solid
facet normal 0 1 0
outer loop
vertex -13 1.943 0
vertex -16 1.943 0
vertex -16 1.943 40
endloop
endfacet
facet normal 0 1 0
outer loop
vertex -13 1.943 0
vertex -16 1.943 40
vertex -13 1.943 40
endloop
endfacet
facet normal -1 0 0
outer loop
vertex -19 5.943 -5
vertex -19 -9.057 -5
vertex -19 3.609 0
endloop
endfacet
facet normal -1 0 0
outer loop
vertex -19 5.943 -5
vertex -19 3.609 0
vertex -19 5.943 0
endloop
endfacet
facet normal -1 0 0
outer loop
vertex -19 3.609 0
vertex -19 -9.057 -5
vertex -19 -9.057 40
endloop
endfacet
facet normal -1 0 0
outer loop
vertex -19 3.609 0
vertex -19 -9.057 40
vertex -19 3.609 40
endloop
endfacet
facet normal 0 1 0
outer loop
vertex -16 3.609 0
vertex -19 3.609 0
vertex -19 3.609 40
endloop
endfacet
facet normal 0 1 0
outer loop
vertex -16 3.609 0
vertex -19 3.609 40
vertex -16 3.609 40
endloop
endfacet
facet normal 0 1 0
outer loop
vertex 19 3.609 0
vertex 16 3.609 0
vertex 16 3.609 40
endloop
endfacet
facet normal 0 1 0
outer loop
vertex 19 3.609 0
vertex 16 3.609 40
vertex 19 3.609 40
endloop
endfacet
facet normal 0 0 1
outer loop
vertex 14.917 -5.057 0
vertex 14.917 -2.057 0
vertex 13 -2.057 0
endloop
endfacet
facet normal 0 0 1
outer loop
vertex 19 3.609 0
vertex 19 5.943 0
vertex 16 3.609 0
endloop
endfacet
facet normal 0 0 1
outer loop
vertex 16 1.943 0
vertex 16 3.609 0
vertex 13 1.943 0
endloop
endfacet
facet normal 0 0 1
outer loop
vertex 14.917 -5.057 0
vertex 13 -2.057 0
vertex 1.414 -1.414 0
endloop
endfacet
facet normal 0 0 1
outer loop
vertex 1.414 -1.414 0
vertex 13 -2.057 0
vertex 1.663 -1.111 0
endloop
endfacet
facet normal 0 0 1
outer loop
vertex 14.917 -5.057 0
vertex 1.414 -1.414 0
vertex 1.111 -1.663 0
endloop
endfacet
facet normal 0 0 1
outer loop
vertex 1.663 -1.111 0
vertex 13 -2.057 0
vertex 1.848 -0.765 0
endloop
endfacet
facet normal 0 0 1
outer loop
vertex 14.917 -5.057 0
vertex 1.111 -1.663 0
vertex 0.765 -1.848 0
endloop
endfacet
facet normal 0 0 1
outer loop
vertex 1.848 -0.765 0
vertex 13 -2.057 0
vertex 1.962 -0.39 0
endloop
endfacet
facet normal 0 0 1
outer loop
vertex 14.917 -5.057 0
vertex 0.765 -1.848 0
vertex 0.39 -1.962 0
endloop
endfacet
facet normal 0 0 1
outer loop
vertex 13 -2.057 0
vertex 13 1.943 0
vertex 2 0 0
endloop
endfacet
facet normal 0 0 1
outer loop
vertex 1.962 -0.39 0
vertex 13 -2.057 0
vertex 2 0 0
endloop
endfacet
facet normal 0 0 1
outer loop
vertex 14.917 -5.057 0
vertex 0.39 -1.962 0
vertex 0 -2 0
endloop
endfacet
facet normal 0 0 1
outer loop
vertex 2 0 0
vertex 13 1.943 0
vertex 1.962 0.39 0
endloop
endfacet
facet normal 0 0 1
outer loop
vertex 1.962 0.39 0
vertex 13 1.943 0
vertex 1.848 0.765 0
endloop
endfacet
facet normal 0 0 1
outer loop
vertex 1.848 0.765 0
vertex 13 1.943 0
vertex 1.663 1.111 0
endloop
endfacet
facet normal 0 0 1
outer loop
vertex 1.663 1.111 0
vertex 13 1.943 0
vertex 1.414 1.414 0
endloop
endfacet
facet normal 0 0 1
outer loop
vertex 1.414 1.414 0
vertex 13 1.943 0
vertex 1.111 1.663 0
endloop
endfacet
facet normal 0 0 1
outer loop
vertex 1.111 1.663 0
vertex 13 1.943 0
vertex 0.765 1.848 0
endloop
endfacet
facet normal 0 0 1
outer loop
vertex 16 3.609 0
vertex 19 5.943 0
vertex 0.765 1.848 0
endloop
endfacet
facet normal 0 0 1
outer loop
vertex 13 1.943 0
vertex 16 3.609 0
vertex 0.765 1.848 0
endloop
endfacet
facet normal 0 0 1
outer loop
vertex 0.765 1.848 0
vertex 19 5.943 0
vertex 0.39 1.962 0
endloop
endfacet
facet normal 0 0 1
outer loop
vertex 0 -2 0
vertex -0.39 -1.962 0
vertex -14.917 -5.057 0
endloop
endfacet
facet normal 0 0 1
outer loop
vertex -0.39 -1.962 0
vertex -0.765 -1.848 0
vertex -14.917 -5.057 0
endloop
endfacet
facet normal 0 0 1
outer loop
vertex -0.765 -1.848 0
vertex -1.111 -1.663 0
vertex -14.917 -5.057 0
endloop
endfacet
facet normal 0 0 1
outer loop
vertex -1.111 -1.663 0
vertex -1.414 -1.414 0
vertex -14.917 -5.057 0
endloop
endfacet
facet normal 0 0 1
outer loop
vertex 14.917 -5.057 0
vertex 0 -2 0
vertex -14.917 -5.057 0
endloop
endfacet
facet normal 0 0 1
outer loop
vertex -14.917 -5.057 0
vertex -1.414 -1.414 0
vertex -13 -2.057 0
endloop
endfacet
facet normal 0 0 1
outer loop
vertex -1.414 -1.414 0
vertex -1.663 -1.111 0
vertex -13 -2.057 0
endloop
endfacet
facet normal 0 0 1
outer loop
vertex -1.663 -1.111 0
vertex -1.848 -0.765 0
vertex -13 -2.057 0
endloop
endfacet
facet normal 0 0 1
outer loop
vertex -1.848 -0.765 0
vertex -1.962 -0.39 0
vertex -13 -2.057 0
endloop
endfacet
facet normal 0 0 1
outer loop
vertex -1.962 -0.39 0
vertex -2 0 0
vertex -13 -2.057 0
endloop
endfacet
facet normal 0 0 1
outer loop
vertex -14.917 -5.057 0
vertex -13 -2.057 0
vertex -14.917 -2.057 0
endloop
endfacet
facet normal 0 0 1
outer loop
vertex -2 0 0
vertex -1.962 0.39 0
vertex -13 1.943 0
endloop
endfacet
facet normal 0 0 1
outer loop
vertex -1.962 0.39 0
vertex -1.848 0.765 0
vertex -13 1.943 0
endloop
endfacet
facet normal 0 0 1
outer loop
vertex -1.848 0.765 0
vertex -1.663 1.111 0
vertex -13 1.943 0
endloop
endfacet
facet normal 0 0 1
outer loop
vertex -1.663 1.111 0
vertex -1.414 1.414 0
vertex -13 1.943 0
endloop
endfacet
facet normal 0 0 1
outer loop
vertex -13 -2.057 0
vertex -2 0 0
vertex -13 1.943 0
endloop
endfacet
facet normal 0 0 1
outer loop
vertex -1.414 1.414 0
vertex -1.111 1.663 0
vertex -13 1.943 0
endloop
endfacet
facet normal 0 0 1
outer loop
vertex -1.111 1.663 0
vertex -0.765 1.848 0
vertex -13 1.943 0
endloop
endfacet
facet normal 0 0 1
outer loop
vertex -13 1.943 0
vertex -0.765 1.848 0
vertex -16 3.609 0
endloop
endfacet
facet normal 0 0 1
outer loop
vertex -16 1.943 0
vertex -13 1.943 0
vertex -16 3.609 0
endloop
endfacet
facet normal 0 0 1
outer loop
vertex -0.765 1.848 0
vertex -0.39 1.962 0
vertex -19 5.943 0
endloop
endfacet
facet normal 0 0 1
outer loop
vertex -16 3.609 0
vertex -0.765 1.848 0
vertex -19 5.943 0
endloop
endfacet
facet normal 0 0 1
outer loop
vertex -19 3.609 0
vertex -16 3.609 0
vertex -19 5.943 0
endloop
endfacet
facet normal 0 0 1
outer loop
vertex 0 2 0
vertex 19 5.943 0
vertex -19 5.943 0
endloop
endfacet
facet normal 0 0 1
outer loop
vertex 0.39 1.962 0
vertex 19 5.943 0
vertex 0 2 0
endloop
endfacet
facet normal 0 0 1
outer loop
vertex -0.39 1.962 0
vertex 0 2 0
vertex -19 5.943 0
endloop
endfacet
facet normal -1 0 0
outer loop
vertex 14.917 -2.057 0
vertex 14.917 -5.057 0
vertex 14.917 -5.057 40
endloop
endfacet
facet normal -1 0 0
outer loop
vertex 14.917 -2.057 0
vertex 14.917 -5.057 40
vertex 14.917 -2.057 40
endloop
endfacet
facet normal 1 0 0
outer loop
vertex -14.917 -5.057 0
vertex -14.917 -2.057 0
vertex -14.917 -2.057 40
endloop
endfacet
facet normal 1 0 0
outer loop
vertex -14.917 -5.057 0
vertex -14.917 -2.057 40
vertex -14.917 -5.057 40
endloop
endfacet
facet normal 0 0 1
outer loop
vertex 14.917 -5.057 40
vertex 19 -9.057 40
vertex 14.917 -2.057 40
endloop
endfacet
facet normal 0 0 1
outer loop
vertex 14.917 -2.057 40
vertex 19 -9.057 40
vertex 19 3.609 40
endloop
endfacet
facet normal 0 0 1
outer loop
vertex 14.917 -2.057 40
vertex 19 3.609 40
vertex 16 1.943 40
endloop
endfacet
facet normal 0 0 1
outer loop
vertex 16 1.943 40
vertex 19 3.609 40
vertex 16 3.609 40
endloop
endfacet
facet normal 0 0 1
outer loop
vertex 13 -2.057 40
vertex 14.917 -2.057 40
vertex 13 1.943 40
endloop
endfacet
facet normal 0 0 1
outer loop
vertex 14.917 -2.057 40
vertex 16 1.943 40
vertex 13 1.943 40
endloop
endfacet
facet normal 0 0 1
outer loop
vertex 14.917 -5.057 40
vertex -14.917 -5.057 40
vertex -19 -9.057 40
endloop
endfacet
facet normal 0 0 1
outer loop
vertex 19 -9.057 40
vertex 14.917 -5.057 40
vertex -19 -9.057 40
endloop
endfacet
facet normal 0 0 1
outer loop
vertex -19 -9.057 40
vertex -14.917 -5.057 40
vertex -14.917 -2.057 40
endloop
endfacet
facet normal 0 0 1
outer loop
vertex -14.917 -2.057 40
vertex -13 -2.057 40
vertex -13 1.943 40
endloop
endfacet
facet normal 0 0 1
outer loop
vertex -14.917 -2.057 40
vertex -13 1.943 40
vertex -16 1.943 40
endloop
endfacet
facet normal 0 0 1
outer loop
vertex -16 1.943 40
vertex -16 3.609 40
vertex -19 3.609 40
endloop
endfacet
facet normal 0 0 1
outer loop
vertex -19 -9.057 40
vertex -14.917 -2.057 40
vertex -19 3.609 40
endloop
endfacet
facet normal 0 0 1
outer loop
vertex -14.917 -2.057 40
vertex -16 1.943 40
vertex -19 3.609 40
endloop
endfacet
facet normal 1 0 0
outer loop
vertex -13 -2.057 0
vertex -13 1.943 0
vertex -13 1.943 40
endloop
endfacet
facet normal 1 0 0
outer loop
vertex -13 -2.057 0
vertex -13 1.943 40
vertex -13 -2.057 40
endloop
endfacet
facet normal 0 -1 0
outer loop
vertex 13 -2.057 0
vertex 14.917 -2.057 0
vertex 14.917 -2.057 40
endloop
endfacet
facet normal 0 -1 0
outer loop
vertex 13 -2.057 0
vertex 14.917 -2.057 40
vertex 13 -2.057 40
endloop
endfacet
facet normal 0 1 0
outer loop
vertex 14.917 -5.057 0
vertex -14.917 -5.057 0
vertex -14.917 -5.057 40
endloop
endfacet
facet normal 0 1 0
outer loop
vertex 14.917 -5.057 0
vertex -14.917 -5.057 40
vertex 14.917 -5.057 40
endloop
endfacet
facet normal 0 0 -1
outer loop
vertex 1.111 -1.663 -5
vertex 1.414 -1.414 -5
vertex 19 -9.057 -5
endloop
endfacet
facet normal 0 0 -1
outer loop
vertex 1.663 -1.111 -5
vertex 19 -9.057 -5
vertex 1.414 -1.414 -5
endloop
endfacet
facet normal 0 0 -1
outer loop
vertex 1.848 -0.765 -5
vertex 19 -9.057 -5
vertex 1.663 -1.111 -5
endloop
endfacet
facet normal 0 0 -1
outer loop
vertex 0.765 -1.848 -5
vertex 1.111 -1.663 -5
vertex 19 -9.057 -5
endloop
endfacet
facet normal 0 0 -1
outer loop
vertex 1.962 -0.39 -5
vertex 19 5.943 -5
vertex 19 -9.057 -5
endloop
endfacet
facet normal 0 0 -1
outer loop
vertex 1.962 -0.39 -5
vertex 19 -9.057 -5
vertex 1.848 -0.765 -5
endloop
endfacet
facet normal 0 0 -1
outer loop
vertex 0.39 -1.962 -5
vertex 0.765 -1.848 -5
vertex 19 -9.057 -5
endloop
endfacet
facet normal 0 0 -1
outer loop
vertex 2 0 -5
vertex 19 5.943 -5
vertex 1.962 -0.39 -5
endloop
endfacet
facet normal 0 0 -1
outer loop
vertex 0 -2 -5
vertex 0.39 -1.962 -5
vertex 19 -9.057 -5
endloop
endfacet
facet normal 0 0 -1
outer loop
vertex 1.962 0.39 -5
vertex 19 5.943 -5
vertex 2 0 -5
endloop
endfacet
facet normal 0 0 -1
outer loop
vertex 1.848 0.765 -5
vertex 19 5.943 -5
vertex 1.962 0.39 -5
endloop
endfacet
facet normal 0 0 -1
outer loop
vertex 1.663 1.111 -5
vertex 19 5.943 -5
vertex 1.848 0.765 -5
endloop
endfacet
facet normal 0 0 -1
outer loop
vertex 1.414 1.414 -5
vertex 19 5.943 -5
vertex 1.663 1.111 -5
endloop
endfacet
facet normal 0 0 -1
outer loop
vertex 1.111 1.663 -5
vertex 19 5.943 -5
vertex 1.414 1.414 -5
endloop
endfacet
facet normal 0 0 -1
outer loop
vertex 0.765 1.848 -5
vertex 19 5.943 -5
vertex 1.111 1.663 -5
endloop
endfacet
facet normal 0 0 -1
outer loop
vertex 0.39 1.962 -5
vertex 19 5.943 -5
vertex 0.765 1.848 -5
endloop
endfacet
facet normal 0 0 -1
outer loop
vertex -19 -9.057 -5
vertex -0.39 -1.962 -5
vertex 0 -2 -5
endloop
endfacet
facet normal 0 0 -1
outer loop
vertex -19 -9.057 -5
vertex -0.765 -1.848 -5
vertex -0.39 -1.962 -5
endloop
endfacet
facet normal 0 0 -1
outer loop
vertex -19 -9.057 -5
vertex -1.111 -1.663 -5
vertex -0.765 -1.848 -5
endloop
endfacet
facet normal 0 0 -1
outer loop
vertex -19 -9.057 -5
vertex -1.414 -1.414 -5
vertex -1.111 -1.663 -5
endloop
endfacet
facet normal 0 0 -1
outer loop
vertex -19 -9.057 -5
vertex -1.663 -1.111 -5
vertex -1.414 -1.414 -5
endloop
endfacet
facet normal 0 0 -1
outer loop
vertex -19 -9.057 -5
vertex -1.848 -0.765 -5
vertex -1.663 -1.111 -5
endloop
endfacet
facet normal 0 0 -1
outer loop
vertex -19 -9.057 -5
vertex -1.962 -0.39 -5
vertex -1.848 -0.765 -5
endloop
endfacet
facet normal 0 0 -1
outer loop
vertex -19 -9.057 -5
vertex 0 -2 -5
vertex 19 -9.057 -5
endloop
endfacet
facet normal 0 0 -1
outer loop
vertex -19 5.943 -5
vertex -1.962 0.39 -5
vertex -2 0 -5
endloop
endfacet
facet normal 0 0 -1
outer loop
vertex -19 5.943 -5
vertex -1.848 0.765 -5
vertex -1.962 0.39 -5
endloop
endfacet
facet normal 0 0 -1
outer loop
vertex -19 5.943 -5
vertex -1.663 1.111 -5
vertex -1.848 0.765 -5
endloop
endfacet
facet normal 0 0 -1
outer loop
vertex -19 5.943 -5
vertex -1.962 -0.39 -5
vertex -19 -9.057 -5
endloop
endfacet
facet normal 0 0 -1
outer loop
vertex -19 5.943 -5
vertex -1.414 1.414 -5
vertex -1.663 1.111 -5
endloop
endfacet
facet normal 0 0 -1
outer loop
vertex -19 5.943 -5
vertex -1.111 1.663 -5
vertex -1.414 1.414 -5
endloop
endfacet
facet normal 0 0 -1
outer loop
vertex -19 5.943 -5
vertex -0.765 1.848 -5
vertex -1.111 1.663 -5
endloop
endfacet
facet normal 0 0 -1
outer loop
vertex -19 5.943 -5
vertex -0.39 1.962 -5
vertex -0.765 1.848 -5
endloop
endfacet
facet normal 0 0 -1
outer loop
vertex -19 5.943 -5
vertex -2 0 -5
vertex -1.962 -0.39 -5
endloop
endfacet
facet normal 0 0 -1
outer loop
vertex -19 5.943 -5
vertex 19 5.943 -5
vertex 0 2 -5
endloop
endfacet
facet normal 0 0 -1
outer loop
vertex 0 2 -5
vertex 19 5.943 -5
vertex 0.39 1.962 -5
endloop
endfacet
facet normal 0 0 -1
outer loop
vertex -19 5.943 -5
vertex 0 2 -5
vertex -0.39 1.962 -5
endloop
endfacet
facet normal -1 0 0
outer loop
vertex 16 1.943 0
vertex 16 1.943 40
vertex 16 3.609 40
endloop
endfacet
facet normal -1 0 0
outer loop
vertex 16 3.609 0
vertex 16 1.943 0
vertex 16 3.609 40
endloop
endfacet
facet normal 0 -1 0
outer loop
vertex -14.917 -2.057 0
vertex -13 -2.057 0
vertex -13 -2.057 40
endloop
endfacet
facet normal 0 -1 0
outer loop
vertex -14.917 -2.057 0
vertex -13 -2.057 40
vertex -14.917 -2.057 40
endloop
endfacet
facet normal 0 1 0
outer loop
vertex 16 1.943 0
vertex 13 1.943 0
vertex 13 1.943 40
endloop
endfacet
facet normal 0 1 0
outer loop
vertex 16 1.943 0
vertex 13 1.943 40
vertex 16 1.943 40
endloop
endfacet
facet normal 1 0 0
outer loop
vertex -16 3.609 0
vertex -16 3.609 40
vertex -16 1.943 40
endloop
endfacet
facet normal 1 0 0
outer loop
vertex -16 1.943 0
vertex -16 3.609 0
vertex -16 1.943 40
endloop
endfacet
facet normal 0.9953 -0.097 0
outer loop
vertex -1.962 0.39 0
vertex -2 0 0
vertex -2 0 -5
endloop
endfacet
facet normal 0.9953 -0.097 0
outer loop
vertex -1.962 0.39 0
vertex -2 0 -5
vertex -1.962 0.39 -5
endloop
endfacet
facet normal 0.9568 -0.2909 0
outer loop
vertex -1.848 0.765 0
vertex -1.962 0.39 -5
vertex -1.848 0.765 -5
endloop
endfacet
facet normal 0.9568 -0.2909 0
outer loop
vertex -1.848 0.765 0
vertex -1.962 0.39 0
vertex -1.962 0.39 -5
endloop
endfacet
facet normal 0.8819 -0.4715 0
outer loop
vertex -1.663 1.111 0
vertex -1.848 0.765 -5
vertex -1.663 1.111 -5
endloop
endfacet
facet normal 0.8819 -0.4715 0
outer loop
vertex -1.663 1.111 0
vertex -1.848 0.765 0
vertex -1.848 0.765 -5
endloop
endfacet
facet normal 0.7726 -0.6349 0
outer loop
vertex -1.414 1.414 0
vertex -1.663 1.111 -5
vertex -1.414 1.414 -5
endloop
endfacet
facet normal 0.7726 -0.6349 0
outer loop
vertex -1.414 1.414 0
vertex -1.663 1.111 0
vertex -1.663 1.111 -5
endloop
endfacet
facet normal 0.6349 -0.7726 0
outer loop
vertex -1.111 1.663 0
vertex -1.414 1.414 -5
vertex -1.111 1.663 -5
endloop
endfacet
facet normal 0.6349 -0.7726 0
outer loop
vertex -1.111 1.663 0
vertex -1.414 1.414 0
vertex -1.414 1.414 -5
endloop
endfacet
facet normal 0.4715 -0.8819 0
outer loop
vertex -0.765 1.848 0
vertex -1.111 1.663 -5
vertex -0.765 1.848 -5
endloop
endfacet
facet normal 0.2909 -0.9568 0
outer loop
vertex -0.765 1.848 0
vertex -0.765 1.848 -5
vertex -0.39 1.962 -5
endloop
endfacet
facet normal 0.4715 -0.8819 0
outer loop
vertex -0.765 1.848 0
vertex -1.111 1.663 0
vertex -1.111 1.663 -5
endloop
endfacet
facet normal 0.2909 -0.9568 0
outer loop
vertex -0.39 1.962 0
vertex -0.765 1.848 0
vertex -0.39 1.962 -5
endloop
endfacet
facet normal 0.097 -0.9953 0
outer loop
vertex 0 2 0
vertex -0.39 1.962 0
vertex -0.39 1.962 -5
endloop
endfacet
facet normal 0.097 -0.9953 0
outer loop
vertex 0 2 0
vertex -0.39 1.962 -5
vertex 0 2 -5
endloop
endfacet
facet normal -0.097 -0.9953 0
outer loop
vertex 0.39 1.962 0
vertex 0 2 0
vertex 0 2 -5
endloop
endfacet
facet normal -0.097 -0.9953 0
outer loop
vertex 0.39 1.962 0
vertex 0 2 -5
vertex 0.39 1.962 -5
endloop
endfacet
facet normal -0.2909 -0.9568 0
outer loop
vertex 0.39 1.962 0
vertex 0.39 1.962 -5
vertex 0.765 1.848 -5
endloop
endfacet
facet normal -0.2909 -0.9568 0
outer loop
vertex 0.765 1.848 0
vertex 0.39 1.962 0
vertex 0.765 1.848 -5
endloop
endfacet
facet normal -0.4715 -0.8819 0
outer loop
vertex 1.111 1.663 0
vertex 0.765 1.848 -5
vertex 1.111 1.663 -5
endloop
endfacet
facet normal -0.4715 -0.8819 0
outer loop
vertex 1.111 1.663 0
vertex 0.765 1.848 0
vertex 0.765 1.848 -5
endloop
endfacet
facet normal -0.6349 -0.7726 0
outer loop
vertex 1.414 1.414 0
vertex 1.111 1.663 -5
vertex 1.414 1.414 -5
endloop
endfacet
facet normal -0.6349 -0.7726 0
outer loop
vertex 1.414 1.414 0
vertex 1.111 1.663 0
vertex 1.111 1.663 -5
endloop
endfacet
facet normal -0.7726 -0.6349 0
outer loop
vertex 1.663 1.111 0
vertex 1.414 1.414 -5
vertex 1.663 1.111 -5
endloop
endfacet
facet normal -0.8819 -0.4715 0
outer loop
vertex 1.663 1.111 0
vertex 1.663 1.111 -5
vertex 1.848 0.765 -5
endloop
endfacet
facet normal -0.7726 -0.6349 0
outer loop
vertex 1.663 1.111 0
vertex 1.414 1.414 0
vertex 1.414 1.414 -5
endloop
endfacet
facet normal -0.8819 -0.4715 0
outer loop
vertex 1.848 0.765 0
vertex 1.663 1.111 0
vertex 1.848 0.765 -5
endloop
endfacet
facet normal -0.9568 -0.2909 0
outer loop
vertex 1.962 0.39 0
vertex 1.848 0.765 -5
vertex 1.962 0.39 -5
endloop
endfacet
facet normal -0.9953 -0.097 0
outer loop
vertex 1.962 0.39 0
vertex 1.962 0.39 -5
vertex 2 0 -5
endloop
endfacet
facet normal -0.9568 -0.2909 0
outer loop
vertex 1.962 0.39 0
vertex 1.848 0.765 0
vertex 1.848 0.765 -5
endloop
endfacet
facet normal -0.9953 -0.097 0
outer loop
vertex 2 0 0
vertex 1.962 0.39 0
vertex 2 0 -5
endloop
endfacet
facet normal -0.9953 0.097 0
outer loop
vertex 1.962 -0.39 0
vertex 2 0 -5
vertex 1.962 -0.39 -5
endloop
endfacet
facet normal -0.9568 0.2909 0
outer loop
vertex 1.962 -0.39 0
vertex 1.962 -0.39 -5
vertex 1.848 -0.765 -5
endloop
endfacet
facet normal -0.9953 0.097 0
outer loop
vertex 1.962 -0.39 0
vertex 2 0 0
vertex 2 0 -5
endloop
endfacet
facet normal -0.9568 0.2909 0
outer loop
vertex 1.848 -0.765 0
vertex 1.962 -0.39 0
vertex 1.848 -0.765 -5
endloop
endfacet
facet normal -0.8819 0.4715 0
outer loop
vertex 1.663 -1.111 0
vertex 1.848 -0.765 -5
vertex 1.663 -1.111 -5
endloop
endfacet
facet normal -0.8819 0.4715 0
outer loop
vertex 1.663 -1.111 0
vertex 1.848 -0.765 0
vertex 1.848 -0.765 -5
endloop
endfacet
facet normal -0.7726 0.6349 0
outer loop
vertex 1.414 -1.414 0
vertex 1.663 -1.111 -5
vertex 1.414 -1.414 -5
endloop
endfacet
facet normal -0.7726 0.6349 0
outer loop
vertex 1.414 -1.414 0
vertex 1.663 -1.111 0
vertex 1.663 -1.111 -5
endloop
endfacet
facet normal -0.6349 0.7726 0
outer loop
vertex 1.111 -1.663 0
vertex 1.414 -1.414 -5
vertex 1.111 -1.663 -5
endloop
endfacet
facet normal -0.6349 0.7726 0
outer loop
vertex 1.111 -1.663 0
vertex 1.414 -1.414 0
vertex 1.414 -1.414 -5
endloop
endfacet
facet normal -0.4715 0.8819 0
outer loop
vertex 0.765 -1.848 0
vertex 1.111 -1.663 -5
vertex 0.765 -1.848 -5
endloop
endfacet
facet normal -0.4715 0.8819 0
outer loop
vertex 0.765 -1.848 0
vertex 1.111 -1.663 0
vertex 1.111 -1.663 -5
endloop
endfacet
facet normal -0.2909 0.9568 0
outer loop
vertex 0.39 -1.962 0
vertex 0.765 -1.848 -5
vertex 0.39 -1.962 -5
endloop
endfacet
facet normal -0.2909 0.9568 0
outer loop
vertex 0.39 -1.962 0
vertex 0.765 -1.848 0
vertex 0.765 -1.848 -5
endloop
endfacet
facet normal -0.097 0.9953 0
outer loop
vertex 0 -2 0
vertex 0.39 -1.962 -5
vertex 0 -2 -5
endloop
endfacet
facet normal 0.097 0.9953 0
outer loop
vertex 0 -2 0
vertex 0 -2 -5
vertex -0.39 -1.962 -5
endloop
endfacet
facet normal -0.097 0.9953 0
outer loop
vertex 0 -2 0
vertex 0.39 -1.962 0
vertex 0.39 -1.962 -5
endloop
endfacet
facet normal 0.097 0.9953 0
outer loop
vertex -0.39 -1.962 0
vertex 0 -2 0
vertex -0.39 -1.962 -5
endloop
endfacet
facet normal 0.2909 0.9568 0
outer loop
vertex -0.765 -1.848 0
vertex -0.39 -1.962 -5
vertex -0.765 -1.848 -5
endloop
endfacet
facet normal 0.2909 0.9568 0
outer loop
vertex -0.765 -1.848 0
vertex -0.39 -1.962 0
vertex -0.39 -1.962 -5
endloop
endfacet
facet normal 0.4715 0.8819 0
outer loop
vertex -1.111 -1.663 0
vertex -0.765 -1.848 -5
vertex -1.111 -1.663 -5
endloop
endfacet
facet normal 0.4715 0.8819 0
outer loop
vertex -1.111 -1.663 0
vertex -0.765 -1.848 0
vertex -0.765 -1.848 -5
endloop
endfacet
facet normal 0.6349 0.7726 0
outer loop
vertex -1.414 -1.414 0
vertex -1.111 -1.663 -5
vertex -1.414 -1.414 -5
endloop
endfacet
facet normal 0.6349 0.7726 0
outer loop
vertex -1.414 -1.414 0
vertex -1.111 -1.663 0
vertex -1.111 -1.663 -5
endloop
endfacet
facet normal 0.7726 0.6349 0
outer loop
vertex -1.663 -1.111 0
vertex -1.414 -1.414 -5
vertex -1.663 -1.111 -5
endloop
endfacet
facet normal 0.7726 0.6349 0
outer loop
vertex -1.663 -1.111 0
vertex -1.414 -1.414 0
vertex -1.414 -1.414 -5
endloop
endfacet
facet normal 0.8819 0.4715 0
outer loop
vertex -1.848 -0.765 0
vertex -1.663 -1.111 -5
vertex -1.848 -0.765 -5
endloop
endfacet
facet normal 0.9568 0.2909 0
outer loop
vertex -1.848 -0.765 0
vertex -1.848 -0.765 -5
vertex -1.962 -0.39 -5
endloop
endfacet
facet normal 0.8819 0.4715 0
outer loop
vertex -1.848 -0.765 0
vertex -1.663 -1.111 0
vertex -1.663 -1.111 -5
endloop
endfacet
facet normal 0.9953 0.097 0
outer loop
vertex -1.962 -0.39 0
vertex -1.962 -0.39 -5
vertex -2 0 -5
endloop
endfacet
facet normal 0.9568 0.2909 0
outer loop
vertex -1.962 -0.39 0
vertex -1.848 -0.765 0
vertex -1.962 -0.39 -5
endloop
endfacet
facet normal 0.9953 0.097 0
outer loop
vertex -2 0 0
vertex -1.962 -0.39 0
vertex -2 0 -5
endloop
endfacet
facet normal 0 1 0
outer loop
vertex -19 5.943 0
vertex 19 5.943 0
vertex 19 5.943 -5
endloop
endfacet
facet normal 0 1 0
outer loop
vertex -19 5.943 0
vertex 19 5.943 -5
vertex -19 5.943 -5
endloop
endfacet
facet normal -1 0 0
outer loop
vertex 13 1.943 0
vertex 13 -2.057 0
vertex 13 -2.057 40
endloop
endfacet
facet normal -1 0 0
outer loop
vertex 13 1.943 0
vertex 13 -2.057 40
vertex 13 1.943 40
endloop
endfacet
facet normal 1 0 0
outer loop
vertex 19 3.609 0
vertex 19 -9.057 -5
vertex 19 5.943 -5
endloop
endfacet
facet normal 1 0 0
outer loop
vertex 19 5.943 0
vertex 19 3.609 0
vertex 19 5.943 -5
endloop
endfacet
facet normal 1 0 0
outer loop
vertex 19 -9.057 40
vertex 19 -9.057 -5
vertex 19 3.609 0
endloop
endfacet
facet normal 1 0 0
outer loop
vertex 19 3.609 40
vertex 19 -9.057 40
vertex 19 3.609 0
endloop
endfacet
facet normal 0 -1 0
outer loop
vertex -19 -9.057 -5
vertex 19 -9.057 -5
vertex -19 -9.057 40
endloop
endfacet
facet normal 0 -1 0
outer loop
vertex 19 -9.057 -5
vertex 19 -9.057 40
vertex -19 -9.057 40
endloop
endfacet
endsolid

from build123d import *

# Parameters (mm, degrees)
AUFSATZ_LINEAR_AUSTRAGEN1_DEPTH = 40
SKIZZE2_W                       = 38
SKIZZE2_H                       = 15
SKIZZE2_R                       = 2
AUFSATZ_LINEAR_AUSTRAGEN2_DEPTH = 5


with BuildPart() as part:
    # Skizze1 → Aufsatz-Linear austragen1 (new body)
    with BuildSketch(Plane.XY):
        Polygon((-16, 1.942512926), (-13, 1.942512926), (-13, -2.057487074), (-14.916666667, -2.057487074), (-14.916666667, -5.057487074), (14.916666667, -5.057487074), (14.916666667, -2.057487074), (13, -2.057487074), (13, 1.942512926), (16, 1.942512926), (16, 3.609179593), (19, 3.609179593), (19, -9.057487074), (-19, -9.057487074), (-19, 3.609179593), (-16, 3.609179593), align=None)
    extrude(amount=AUFSATZ_LINEAR_AUSTRAGEN1_DEPTH)

    # Skizze2 → Aufsatz-Linear austragen2 (add)
    with BuildSketch(Plane(origin=(0, 0, 0), x_dir=(-1, 0, 0), z_dir=(0, 0, -1))):
        with Locations((0, -1.557487074)):
            Rectangle(SKIZZE2_W, SKIZZE2_H)
        Circle(SKIZZE2_R, mode=Mode.SUBTRACT)
    extrude(amount=AUFSATZ_LINEAR_AUSTRAGEN2_DEPTH)


solid = part.part
